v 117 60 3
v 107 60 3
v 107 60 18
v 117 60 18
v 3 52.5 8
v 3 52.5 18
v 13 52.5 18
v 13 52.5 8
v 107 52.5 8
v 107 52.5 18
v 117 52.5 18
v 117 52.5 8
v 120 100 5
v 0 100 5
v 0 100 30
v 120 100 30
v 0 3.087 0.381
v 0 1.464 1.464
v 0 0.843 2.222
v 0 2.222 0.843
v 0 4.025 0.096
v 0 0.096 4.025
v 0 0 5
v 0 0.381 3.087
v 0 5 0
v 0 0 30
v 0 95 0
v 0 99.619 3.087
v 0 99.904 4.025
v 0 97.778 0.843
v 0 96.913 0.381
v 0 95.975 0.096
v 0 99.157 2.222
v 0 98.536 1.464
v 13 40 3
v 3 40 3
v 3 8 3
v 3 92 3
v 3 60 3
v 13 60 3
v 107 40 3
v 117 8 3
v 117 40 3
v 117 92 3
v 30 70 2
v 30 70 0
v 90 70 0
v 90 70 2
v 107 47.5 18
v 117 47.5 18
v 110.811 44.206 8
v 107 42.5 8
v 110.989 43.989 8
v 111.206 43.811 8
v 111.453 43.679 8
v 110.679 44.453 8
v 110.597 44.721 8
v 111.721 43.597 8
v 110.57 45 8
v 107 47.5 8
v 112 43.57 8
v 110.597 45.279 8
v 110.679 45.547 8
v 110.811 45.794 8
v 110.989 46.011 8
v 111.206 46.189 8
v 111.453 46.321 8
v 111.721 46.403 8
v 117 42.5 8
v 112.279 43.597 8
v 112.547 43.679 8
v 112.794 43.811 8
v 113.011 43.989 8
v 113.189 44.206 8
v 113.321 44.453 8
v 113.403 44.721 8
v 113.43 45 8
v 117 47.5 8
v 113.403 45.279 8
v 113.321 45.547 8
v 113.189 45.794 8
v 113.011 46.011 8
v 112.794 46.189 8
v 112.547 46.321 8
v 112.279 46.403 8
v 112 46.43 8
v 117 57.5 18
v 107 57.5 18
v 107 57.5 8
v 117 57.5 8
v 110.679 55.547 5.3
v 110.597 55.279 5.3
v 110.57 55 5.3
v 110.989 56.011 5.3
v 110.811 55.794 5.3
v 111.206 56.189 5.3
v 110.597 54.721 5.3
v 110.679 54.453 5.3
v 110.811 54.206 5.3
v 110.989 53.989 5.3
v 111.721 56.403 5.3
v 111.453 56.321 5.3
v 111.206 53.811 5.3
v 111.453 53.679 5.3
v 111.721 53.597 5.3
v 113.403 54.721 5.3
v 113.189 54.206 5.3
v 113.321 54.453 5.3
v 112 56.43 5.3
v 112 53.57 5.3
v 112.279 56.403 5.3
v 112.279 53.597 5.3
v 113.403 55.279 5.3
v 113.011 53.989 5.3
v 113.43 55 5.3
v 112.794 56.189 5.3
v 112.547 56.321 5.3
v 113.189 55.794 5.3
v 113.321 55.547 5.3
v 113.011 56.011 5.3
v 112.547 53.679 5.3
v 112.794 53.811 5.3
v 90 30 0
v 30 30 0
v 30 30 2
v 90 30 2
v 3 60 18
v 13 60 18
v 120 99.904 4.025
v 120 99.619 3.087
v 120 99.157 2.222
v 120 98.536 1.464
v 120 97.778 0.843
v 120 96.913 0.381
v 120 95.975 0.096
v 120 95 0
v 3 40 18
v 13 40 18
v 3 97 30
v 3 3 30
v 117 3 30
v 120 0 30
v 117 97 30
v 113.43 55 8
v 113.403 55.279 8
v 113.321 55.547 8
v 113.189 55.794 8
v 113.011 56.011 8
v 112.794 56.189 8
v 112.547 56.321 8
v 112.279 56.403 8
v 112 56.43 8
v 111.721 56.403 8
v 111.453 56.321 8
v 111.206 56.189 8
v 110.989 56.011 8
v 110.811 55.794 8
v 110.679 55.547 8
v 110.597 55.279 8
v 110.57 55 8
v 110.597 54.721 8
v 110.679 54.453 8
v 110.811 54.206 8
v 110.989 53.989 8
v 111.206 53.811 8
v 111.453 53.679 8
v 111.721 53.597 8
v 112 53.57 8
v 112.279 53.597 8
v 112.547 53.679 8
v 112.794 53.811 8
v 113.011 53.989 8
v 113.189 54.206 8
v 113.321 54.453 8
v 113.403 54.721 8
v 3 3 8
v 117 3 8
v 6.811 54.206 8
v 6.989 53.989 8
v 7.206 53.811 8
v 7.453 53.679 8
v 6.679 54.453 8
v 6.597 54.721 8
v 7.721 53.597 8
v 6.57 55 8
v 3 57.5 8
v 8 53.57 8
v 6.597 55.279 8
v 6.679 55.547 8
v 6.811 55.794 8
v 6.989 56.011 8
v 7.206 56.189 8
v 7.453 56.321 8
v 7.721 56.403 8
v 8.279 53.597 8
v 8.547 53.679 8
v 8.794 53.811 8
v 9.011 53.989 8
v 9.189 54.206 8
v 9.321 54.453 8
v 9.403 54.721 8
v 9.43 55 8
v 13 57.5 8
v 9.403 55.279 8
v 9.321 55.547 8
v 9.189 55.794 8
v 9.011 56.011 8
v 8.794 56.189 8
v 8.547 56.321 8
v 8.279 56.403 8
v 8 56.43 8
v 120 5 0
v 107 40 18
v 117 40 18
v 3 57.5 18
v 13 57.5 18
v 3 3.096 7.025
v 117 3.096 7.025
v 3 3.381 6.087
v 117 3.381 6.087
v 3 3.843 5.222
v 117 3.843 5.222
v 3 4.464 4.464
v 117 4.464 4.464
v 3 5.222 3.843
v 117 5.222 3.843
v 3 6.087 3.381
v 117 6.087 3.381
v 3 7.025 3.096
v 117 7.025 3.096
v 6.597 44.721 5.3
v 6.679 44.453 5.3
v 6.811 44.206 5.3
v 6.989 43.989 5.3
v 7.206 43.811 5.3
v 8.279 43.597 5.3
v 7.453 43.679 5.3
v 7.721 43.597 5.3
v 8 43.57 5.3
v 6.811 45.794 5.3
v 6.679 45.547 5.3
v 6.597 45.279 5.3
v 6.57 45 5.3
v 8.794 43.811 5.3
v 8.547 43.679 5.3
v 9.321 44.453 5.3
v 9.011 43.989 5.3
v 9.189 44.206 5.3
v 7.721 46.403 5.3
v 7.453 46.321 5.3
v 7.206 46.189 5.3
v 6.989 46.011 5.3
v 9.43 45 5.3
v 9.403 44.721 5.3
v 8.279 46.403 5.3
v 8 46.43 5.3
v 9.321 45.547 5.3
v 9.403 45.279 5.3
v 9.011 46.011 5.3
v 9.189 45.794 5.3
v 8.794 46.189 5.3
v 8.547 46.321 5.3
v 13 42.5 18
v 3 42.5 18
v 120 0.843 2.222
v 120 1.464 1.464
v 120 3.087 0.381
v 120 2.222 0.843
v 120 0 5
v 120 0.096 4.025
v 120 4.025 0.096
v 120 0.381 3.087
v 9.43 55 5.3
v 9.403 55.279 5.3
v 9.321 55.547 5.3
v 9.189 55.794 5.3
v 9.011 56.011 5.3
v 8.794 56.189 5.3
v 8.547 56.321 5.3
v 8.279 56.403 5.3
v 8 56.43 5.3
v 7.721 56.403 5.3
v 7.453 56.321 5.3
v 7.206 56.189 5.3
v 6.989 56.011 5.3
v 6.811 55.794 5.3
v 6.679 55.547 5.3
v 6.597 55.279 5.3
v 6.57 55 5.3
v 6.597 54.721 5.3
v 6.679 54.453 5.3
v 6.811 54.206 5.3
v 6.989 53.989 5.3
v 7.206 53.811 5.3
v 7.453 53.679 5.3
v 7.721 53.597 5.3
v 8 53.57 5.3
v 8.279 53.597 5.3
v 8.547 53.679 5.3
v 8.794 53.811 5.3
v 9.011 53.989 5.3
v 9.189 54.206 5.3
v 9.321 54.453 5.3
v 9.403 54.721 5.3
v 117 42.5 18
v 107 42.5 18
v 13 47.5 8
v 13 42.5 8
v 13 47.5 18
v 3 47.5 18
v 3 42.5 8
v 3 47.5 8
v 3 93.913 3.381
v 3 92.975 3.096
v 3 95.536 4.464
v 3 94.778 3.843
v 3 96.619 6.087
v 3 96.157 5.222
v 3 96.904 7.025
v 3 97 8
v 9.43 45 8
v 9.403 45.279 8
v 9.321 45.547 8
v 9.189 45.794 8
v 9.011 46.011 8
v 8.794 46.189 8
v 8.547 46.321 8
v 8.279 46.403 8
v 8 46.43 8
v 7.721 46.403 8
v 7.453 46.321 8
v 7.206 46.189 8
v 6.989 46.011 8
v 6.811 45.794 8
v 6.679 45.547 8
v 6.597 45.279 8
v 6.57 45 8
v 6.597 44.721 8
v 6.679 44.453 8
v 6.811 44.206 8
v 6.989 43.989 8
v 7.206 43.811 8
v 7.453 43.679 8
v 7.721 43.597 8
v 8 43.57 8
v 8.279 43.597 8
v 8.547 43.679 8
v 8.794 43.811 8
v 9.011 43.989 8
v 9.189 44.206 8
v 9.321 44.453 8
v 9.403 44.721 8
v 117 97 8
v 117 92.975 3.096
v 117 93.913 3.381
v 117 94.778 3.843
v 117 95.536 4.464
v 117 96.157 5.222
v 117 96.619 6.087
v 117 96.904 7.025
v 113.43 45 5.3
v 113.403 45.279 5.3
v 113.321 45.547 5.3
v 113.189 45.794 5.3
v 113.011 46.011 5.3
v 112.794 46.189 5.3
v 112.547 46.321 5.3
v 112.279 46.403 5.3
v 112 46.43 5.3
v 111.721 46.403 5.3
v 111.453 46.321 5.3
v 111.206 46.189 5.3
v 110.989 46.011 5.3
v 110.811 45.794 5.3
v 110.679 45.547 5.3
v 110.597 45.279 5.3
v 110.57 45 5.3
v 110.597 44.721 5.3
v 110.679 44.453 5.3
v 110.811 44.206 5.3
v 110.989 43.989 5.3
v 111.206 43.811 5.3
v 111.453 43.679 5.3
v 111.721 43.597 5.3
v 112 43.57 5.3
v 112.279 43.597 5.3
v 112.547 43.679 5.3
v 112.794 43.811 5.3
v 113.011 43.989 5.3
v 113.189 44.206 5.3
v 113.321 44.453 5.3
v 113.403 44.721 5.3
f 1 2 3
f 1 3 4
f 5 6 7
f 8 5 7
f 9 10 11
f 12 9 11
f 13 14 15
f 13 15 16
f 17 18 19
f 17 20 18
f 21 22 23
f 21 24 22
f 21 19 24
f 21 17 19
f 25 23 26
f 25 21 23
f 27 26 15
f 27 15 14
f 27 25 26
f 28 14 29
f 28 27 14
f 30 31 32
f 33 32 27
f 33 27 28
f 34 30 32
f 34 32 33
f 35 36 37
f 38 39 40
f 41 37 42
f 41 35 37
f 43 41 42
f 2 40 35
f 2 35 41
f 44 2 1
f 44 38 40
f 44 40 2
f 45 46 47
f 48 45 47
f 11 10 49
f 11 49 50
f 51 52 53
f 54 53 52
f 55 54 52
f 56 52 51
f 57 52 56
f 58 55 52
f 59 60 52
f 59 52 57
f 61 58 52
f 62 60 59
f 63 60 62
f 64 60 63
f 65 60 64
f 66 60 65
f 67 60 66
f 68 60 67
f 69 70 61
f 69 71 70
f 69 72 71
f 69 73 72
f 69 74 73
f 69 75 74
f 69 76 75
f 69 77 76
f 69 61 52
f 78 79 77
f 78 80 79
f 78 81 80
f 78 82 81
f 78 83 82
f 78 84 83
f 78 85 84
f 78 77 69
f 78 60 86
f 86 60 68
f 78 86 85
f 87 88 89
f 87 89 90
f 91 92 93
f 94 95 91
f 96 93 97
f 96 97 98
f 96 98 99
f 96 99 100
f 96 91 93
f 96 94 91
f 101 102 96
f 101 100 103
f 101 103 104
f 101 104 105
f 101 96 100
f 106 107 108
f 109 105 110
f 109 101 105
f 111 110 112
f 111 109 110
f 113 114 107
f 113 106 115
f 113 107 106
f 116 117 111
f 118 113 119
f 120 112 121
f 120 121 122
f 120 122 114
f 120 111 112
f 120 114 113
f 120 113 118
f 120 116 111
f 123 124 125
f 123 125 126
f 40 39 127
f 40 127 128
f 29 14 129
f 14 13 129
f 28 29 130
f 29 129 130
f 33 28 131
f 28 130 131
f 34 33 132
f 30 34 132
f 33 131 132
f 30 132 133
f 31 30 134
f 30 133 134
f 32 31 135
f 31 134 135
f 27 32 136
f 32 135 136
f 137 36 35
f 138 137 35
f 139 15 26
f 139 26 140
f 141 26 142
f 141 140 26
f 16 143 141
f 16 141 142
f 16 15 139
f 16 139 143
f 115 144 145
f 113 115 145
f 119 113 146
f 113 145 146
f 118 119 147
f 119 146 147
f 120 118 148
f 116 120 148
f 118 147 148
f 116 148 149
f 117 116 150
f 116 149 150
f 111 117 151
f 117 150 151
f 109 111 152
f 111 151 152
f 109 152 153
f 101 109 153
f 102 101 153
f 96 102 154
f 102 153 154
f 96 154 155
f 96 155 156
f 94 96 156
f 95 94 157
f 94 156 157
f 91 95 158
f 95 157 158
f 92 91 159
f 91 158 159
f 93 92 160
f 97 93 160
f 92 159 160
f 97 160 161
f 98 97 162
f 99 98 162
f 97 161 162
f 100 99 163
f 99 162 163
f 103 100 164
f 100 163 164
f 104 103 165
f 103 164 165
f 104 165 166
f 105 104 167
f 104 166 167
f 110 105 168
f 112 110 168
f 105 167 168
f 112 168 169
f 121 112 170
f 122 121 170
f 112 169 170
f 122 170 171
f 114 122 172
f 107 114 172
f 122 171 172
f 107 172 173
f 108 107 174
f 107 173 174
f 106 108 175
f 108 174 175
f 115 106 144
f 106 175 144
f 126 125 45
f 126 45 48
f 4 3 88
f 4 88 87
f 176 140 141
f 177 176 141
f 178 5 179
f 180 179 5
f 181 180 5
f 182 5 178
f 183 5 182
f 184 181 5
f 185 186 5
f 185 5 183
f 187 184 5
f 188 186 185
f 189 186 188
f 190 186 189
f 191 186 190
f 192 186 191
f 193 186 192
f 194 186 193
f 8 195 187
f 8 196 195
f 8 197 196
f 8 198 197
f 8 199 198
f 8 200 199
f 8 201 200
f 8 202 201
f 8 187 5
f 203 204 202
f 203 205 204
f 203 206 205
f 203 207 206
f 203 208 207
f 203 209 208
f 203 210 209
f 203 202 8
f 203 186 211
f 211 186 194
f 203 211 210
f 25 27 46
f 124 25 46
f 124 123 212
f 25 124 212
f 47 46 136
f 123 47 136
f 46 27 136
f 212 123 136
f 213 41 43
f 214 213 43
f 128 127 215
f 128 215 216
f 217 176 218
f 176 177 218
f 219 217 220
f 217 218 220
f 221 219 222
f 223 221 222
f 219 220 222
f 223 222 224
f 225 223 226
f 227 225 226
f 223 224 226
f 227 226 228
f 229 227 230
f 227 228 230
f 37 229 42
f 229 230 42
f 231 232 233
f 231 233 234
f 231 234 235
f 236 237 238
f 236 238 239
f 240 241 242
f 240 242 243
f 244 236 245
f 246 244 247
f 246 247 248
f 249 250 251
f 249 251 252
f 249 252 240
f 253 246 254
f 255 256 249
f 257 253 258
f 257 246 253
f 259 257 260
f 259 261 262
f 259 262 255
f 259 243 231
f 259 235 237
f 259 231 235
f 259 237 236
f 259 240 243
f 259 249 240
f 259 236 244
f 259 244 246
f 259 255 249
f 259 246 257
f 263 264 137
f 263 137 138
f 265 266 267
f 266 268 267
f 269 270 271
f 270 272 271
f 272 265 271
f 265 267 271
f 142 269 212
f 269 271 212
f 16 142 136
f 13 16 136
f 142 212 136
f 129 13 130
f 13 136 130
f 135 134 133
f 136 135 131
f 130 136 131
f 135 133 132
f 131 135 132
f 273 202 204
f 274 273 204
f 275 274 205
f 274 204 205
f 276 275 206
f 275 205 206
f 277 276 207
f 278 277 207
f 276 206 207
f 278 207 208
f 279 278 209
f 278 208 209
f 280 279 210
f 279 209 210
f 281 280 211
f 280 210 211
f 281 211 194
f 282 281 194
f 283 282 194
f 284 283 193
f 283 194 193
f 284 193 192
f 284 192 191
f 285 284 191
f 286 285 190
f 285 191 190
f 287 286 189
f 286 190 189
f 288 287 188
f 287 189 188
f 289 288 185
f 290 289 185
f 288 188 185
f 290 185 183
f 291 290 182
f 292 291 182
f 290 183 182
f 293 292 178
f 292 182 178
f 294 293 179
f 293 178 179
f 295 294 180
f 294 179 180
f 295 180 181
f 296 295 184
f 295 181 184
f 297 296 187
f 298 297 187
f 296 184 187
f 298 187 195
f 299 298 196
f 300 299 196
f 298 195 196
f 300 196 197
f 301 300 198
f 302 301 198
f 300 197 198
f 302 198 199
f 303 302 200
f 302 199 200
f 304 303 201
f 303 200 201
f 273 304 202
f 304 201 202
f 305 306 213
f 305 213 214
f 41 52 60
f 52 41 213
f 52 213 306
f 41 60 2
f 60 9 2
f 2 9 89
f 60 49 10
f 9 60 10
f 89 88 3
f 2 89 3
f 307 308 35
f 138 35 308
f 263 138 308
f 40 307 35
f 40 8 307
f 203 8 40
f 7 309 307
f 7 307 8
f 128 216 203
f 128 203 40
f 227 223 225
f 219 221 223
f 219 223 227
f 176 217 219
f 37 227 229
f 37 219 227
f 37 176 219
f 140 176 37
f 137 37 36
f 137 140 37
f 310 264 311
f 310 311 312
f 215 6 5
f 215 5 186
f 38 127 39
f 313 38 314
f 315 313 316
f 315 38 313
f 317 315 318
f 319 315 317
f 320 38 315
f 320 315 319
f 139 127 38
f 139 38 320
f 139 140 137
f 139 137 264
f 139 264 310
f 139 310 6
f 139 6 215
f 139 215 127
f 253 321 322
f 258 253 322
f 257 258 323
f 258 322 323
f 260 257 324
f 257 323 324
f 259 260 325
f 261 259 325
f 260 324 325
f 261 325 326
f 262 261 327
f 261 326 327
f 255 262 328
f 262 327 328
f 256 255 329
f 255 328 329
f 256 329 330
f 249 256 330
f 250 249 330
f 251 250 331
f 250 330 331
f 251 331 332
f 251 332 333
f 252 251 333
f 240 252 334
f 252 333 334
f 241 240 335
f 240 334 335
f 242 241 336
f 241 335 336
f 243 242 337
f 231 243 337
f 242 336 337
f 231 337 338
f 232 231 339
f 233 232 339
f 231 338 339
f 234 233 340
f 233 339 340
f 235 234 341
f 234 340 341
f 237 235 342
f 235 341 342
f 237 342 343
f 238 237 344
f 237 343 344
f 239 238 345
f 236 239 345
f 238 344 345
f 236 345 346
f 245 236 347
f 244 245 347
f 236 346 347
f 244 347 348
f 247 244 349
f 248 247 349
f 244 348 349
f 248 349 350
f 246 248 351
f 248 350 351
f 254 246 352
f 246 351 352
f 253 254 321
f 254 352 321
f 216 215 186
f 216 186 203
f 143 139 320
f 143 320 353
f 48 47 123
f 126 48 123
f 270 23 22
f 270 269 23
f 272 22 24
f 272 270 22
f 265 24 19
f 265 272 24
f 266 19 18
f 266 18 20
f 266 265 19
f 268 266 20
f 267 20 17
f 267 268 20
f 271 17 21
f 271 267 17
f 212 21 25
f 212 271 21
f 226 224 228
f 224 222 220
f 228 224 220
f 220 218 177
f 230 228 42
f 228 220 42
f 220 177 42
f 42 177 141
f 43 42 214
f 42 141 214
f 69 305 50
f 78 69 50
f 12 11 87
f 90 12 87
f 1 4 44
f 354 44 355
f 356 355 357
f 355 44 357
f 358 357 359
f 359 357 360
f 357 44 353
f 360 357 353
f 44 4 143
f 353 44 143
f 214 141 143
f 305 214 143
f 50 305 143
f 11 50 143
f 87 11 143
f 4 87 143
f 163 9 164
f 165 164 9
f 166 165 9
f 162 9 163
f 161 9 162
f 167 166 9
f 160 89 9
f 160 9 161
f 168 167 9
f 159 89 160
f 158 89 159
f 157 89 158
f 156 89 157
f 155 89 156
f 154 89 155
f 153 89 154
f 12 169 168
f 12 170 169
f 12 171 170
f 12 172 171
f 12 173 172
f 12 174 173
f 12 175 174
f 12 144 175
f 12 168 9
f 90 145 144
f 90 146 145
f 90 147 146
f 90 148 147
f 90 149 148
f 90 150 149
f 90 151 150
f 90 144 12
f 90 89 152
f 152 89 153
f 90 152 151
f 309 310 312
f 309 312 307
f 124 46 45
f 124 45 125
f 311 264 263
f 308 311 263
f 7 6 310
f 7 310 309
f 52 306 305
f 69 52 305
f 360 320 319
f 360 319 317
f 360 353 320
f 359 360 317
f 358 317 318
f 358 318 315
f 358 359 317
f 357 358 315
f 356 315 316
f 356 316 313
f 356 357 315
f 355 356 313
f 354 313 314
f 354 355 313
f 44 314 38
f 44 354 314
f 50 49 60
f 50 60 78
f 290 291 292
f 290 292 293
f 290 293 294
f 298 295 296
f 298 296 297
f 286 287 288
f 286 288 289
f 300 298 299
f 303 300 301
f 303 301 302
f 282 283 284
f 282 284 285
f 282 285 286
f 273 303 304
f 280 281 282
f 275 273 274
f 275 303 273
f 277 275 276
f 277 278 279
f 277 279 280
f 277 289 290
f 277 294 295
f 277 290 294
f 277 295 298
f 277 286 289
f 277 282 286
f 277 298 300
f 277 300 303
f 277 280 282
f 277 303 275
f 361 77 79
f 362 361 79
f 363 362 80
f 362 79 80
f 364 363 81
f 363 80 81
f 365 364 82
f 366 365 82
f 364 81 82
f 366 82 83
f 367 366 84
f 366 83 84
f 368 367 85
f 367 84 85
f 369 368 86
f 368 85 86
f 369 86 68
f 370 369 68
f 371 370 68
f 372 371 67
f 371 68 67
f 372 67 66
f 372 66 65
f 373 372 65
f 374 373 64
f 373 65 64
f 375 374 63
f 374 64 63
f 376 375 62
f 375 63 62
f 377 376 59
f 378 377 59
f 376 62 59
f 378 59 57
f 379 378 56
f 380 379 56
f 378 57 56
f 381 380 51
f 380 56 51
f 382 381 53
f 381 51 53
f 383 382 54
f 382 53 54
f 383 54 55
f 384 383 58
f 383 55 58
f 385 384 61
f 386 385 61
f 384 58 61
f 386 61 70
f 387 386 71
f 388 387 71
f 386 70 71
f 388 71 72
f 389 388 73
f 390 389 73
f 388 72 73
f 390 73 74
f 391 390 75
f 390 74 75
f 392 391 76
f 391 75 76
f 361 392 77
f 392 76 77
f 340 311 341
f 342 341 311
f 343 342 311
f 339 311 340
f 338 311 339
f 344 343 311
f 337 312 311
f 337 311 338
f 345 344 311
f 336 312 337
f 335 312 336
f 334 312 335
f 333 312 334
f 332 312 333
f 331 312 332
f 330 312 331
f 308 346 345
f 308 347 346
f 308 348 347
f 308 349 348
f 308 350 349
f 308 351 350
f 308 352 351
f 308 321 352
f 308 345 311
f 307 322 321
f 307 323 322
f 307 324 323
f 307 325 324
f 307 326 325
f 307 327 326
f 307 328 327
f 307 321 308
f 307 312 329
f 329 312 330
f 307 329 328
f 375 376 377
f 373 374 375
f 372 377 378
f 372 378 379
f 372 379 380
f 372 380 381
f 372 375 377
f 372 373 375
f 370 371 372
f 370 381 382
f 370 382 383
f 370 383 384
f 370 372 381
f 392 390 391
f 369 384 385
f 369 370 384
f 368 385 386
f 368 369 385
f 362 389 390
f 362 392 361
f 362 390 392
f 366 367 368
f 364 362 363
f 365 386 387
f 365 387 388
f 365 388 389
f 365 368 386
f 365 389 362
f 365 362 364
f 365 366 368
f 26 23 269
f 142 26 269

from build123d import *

# Parameters (mm, degrees)
BOX_W           = 120
BOX_H           = 100
BOX_DEPTH       = 30
SKETCH_W        = 114
SKETCH_H        = 94
POCKET_DEPTH    = 27
SKETCH001_W     = 114
SKETCH001_H     = 20
PAD_DEPTH       = 15
SKETCH002_W     = 114
SKETCH002_H     = 5
POCKET001_DEPTH = 10
SKETCH003_W     = 94
SKETCH003_H     = 20
POCKET002_DEPTH = 15
SKETCH008_R     = 1.43
POCKET005_DEPTH = 2.7
FILLET_R        = 5
SKETCH011_W     = 60
SKETCH011_H     = 40
POCKET008_DEPTH = 2


with BuildPart() as part:
    # Box → Box (new body)
    with BuildSketch(Plane.XY):
        with Locations((60, 50)):
            Rectangle(BOX_W, BOX_H)
    extrude(amount=BOX_DEPTH)

    # Sketch (on Face6 of BaseFeature) → Pocket (cut)
    with BuildSketch(Plane.XY.offset(30)):
        with Locations((60, 50)):
            Rectangle(SKETCH_W, SKETCH_H)
    extrude(amount=-POCKET_DEPTH, mode=Mode.SUBTRACT)

    # Sketch001 (on Face11 of Pocket) → Pad (join)
    with BuildSketch(Plane.XY.offset(3)):
        with Locations((60, 50)):
            Rectangle(SKETCH001_W, SKETCH001_H)
    extrude(amount=PAD_DEPTH)

    # Sketch002 (on Face13 of Pad) → Pocket001 (cut)
    with BuildSketch(Plane.XY.offset(18)):
        with Locations((60, 55)):
            Rectangle(SKETCH002_W, SKETCH002_H)
        with Locations((60, 45)):
            Rectangle(SKETCH002_W, SKETCH002_H)
    extrude(amount=-POCKET001_DEPTH, mode=Mode.SUBTRACT)

    # Sketch003 (on Face15 of Pocket001) → Pocket002 (cut)
    with BuildSketch(Plane.XY.offset(18)):
        with Locations((60, 50)):
            Rectangle(SKETCH003_W, SKETCH003_H)
    extrude(amount=-POCKET002_DEPTH, mode=Mode.SUBTRACT)

    # Sketch008 (on Face41 of Pocket002) → Pocket005 (cut)
    with BuildSketch(Plane.XY.offset(8)):
        with Locations((112, 45)):
            Circle(SKETCH008_R)
        with Locations((112, 55)):
            Circle(SKETCH008_R)
        with Locations((8, 45)):
            Circle(SKETCH008_R)
        with Locations((8, 55)):
            Circle(SKETCH008_R)
    extrude(amount=-POCKET005_DEPTH, mode=Mode.SUBTRACT)

    # Fillet
    fillet_edges = [part.edges().sort_by_distance(p)[0] for p in [
        (60, 0, 0),
        (60, 3, 3),
        (60, 97, 3),
        (60, 100, 0),
    ]]
    fillet(fillet_edges, radius=FILLET_R)

    # Sketch011 (on Face5 of Fillet) → Pocket008 (cut)
    with BuildSketch(Plane(origin=(0, 0, 0), x_dir=(1, 0, 0), z_dir=(0, 0, -1))):
        with Locations((60, -50)):
            Rectangle(SKETCH011_W, SKETCH011_H)
    extrude(amount=-POCKET008_DEPTH, mode=Mode.SUBTRACT)


solid = part.part
